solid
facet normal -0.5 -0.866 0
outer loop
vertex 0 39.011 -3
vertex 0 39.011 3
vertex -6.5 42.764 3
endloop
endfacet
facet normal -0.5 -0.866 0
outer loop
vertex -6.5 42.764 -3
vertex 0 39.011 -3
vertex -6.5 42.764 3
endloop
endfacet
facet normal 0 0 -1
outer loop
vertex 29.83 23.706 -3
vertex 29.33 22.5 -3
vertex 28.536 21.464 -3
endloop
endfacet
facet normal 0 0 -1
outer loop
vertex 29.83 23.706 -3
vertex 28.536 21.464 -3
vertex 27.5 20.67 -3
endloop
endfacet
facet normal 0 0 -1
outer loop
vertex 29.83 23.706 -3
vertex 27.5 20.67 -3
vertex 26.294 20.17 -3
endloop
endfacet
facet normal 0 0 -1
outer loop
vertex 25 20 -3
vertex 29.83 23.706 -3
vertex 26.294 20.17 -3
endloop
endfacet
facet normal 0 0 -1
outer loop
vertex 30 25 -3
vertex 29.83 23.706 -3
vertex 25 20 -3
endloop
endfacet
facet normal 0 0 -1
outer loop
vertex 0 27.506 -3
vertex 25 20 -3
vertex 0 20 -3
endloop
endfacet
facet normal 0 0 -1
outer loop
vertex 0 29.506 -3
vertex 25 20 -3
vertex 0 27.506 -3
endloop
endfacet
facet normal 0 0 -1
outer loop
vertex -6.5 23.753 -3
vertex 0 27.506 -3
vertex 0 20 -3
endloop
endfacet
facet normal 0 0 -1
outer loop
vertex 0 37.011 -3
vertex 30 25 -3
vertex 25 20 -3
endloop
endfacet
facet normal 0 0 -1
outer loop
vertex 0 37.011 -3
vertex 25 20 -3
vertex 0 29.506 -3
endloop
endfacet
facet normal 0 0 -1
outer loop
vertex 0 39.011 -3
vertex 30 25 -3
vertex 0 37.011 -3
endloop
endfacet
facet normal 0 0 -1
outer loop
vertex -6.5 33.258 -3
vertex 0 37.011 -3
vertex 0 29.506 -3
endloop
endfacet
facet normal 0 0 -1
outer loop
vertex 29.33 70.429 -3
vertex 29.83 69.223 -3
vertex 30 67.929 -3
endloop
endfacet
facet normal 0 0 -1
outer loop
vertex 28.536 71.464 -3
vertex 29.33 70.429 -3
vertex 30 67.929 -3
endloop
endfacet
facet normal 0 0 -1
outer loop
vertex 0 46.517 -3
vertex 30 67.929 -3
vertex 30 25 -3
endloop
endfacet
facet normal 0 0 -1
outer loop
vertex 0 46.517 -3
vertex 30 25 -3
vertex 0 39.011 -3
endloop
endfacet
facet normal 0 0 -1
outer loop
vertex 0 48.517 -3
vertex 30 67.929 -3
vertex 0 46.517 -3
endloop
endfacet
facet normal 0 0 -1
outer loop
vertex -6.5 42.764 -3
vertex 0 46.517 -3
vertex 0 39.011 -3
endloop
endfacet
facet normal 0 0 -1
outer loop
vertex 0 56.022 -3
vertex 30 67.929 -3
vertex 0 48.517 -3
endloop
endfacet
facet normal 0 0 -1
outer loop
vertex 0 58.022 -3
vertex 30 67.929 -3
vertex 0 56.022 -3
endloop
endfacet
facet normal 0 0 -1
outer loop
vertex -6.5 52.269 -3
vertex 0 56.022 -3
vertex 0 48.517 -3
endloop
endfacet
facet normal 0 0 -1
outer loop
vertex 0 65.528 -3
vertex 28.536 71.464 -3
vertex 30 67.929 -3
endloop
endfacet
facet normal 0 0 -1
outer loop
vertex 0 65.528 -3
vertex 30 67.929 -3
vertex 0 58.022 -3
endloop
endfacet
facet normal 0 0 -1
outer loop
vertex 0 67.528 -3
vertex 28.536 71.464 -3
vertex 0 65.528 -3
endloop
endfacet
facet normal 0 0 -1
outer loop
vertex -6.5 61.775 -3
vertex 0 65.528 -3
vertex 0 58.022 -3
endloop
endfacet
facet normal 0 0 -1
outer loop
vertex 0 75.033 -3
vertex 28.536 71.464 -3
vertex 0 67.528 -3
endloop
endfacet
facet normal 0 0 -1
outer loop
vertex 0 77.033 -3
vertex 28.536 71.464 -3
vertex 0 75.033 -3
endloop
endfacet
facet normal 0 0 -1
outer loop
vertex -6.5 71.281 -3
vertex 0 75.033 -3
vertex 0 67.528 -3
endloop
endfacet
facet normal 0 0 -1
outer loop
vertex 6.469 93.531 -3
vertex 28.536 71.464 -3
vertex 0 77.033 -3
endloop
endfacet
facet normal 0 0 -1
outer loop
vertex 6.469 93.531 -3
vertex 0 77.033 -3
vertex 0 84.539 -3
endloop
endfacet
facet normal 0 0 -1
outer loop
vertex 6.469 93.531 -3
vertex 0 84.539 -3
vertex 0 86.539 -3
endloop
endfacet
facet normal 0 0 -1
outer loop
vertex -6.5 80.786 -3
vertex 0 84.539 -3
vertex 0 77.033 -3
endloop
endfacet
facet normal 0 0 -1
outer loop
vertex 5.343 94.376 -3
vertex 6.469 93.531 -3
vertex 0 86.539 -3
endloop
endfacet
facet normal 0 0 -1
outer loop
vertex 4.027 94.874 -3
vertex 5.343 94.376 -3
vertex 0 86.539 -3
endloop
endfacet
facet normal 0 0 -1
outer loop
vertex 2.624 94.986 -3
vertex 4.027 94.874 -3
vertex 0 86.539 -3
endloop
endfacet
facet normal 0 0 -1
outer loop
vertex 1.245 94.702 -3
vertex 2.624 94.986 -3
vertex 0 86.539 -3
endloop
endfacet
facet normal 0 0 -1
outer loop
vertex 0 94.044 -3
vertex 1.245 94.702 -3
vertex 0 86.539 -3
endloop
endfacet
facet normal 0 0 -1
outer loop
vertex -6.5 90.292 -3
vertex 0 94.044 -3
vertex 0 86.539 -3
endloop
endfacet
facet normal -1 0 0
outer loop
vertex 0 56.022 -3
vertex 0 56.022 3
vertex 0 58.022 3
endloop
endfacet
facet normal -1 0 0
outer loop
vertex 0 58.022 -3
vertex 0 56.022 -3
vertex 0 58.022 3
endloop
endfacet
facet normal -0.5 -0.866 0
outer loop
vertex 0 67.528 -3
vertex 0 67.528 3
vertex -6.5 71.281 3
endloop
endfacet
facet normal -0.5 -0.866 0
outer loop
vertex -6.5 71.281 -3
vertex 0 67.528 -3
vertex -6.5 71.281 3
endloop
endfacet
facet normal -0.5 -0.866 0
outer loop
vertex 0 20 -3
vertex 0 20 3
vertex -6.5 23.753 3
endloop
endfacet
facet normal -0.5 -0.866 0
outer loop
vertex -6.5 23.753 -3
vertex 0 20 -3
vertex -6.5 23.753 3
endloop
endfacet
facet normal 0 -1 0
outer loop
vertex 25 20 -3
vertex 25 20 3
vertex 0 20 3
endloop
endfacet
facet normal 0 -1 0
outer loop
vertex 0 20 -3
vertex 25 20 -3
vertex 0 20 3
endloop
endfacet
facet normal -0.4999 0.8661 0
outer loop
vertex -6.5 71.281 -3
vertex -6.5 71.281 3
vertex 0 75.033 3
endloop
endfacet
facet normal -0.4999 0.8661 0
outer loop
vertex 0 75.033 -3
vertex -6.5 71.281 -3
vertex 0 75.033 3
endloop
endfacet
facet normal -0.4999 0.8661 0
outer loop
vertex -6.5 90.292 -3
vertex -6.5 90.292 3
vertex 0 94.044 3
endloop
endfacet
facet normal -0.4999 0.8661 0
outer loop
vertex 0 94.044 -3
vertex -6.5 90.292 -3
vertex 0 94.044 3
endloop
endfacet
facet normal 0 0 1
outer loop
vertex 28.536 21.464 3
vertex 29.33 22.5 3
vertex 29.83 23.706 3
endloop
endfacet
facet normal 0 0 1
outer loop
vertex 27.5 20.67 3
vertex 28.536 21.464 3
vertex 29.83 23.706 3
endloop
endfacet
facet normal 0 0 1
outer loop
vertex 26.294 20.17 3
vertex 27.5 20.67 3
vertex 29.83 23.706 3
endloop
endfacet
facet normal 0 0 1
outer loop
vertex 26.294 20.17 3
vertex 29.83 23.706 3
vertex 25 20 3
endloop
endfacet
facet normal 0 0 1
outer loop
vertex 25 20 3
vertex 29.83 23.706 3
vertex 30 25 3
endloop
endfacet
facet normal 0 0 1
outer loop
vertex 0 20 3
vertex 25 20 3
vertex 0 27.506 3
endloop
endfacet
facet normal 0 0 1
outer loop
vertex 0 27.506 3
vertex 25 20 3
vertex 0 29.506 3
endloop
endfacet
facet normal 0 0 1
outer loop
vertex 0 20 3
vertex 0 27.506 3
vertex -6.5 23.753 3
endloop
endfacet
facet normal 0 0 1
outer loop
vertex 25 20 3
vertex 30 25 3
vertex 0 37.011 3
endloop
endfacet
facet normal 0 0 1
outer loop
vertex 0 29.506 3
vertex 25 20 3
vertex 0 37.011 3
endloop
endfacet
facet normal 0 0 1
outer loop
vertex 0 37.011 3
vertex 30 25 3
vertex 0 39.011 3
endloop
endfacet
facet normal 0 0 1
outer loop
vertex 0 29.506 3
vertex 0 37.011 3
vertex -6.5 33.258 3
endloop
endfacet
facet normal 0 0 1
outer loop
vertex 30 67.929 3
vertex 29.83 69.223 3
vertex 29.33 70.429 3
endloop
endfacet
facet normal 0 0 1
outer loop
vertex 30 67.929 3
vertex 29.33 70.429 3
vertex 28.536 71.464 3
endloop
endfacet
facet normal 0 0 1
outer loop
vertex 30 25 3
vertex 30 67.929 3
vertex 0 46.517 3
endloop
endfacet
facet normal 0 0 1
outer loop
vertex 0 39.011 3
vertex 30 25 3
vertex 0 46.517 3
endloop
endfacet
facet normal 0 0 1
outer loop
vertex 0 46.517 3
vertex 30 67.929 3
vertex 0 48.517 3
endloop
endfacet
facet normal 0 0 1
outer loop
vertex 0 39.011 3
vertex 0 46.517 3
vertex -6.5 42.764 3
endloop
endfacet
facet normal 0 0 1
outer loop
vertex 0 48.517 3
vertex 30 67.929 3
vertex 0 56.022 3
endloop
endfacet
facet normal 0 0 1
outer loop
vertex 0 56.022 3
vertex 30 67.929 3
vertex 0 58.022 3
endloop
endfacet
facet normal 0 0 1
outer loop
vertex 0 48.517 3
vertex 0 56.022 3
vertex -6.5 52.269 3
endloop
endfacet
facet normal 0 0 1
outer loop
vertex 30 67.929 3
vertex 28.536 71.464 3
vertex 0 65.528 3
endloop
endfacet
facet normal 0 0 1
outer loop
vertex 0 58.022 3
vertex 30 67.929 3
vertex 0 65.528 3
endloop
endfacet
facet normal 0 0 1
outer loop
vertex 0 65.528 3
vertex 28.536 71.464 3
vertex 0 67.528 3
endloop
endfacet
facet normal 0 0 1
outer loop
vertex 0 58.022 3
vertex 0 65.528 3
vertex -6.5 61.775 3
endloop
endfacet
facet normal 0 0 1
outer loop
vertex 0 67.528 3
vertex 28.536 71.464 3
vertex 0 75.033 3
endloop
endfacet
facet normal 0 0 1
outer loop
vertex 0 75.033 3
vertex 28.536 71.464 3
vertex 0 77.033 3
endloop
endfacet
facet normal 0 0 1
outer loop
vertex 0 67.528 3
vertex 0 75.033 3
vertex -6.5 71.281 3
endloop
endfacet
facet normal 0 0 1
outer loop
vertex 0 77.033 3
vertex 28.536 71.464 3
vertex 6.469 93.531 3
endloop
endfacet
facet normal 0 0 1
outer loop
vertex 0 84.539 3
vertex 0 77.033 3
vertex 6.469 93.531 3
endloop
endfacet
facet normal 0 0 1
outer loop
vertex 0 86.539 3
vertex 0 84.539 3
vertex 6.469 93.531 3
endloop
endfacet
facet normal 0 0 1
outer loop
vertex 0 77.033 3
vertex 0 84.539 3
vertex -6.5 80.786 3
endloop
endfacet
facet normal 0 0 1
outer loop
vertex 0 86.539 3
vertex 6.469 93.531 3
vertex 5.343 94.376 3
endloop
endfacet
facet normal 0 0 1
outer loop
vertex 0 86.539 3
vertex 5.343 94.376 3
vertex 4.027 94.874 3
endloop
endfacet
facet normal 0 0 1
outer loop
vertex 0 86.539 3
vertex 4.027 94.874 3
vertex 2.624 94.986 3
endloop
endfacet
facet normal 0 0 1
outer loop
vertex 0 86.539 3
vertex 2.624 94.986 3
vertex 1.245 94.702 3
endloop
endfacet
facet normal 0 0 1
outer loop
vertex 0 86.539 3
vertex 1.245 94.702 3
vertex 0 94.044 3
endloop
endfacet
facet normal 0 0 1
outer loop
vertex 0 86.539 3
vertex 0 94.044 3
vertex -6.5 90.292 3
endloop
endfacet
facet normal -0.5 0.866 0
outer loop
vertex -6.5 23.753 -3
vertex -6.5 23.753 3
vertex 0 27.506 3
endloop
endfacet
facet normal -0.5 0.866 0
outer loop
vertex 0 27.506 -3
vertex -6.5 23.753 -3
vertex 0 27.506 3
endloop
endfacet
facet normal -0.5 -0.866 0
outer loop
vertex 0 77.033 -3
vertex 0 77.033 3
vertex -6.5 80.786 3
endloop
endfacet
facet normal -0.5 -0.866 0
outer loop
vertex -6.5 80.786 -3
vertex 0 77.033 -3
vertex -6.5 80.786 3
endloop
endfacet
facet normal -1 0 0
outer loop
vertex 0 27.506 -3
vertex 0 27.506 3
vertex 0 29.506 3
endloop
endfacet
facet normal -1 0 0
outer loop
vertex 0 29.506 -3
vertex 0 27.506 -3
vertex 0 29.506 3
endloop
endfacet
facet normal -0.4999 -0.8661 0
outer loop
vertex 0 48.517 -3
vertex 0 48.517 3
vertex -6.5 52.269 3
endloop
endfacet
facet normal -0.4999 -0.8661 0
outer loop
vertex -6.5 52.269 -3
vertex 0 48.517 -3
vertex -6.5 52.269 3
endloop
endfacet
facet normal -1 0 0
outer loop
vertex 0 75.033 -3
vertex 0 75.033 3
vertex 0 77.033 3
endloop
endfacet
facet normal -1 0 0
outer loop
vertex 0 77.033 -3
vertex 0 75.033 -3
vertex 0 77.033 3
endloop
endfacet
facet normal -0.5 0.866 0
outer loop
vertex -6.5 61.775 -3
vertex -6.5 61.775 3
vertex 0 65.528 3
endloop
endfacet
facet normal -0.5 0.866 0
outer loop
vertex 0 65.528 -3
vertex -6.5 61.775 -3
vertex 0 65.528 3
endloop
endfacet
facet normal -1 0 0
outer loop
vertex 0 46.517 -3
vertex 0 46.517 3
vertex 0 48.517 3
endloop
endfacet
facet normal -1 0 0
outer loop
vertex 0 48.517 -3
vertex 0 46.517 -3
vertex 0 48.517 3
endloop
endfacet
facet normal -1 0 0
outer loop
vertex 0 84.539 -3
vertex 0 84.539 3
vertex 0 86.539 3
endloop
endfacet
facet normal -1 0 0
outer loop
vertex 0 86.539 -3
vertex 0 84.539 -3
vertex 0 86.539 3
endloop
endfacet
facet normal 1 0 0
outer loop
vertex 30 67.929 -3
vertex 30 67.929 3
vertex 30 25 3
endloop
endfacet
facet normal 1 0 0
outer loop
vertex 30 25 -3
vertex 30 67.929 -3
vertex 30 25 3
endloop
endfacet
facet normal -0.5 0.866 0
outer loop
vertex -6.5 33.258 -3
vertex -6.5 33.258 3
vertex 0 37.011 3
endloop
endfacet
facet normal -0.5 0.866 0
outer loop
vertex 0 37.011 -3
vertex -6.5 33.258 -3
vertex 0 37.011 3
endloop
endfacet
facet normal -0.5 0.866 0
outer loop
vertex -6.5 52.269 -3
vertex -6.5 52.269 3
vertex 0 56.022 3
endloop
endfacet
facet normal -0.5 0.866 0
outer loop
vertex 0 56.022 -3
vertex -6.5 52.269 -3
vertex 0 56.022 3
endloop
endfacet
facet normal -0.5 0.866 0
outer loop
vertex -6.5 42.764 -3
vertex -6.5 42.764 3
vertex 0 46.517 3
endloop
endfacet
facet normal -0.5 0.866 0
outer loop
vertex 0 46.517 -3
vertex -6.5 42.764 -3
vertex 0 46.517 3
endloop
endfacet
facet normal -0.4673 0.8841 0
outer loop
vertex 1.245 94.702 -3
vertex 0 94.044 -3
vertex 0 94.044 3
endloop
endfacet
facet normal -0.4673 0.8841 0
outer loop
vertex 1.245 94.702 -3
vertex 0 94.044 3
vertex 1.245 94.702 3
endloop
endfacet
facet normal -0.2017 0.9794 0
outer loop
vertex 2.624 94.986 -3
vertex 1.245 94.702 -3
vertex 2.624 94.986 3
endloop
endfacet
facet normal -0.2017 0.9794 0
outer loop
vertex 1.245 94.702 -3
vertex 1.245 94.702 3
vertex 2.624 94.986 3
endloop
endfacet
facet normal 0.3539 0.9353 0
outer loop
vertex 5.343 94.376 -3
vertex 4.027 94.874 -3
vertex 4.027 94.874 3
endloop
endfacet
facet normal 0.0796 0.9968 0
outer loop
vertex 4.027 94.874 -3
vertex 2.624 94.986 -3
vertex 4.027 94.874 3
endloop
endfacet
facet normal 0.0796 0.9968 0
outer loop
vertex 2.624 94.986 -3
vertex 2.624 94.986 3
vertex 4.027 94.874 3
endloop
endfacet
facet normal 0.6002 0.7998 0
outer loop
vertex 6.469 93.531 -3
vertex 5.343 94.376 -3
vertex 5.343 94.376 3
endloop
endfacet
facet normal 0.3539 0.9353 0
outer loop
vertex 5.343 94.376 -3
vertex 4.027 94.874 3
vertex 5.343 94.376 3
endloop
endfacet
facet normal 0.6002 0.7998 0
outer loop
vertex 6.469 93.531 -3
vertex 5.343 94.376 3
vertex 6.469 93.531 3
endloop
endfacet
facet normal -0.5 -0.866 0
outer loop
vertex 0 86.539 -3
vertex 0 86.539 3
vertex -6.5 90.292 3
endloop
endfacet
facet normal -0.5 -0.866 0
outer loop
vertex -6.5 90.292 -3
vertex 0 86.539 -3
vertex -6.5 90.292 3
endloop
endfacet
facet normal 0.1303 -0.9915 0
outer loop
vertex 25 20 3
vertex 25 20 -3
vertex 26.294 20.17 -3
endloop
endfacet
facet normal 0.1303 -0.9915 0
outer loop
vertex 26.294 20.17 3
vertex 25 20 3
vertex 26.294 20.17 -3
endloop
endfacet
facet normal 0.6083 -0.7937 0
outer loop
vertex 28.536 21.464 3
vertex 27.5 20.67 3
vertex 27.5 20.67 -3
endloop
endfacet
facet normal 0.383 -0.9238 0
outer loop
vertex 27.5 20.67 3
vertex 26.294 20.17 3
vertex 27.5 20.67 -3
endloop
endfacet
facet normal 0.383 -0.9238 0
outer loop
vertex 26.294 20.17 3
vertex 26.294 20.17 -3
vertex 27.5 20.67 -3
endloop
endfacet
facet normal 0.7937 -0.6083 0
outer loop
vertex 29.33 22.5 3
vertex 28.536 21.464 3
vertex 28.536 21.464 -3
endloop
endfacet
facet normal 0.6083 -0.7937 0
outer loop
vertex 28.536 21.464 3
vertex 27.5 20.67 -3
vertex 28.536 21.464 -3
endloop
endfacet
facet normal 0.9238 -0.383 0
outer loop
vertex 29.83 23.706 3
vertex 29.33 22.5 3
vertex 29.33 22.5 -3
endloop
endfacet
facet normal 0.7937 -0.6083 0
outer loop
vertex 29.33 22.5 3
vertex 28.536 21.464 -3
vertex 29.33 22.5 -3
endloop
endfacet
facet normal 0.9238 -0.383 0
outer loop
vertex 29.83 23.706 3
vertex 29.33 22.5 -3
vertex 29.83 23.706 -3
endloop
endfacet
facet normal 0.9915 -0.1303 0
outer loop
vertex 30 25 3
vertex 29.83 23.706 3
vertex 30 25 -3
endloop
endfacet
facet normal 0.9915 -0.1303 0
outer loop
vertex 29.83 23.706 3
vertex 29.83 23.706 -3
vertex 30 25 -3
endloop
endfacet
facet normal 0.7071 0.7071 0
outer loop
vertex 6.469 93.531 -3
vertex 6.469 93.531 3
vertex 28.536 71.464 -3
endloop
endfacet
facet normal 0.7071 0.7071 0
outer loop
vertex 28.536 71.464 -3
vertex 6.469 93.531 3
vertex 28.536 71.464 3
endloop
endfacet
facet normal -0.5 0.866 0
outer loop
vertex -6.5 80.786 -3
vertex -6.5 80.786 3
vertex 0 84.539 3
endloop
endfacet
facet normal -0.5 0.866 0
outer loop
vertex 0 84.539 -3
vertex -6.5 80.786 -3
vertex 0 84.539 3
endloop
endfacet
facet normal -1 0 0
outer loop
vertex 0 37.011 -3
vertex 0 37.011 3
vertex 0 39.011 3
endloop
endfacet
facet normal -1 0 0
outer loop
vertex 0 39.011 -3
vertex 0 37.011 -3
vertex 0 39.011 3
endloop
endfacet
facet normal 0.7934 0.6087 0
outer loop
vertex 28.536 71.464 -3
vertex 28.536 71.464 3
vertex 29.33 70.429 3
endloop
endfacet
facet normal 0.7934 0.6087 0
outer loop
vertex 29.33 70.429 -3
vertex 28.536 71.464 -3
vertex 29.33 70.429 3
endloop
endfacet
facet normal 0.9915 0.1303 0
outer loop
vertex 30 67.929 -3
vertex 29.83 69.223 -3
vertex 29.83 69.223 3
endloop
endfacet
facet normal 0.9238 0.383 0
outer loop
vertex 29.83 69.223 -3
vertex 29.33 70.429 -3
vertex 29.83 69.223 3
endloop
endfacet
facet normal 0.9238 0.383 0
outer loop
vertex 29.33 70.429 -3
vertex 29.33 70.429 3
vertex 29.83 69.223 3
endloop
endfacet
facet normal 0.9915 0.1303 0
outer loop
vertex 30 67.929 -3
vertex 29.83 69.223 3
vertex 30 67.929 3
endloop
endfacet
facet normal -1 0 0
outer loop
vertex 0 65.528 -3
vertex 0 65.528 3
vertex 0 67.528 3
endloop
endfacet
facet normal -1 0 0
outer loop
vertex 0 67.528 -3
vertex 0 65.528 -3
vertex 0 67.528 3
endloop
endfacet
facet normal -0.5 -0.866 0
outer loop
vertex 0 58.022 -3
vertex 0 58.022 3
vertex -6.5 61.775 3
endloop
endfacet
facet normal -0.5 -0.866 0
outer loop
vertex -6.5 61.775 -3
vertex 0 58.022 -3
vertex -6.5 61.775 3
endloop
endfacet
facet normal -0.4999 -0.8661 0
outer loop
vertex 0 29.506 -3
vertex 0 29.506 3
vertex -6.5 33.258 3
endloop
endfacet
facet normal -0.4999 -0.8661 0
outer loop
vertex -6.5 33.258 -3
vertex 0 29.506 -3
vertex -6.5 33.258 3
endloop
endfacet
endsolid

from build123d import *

# Parameters (mm, degrees)
SALIENTE_EXTRUIR1_DEPTH = 3
SALIENTE_EXTRUIR3_DEPTH = 6
REDONDEO1_R             = 5


with BuildPart() as part:
    # Croquis1 → Saliente-Extruir1 (new, symmetric)
    with BuildSketch(Plane.XY):
        Polygon((0, 20), (0, 100), (30, 70), (30, 20), align=None)
    extrude(amount=SALIENTE_EXTRUIR1_DEPTH, both=True)

    # Croquis4 → Saliente-Extruir3 (add, through all)
    with BuildSketch(Plane.XY.offset(3)):
        Polygon((0, 20), (-6.5, 23.75277675), (0, 27.505553499), align=None)
        Polygon((0, 37.011106999), (0, 29.505553499), (-6.5, 33.258330249), align=None)
        Polygon((0, 46.516660498), (0, 39.011106999), (-6.5, 42.763883749), align=None)
        Polygon((0, 56.022213998), (0, 48.516660498), (-6.5, 52.269437248), align=None)
        Polygon((0, 65.527767497), (0, 58.022213998), (-6.5, 61.774990748), align=None)
        Polygon((0, 75.033320997), (0, 67.527767497), (-6.5, 71.280544247), align=None)
        Polygon((0, 84.538874496), (0, 77.033320997), (-6.5, 80.786097747), align=None)
        Polygon((0, 94.044427996), (0, 86.538874496), (-6.5, 90.291651246), align=None)
    extrude(amount=-SALIENTE_EXTRUIR3_DEPTH)

    # Redondeo1
    # the kernel refuses this fillet: 5 mm, written as the material it takes off along each edge
    with BuildSketch(Plane(origin=(0, 100, 25.871542056), x_dir=(0, -1, 0), z_dir=(0, 0, -1))) as redondeo1_piece_1:
        with BuildLine():
            CenterArc((10.0045829, -2.933515088), REDONDEO1_R, 144.076608278, 80.923391722)
            Line((6.469048994, -6.469048994), (6.398338316, -6.539759672))
            Line((6.398338316, -6.539759672), (-0.070710678, -0.070710678))
            Line((-0.070710678, -0.070710678), (0, 0.1))
            ThreePointArc((0, 0.1), (2.977786002, 0.1), (5.874591786, 0.058670302))
            Line((5.874591786, 0.058670302), (5.955572004, 0))
        make_face()
    extrude(amount=51.743084112, mode=Mode.SUBTRACT)
    with BuildSketch(Plane(origin=(30, 20, -15.5), x_dir=(0, 1, 0), z_dir=(0, 0, 1))) as redondeo1_piece_2:
        with BuildLine():
            CenterArc((REDONDEO1_R, REDONDEO1_R), REDONDEO1_R, 180, 90)
            Line((0, REDONDEO1_R), (-REDONDEO1_R * 0.02, REDONDEO1_R))
            Line((-REDONDEO1_R * 0.02, REDONDEO1_R), (-REDONDEO1_R * 0.02, -REDONDEO1_R * 0.02))
            Line((-REDONDEO1_R * 0.02, -REDONDEO1_R * 0.02), (REDONDEO1_R, -REDONDEO1_R * 0.02))
            Line((REDONDEO1_R, -REDONDEO1_R * 0.02), (REDONDEO1_R, 0))
        make_face()
    extrude(amount=31, mode=Mode.SUBTRACT)
    with BuildSketch(Plane(origin=(30, 70, 8.17766953), x_dir=(-0.7071067811865449, 0.70710678118655, 0), z_dir=(0, 0, -1))) as redondeo1_piece_3:
        with BuildLine():
            CenterArc((REDONDEO1_R * 0.414213562373, -REDONDEO1_R), REDONDEO1_R, 90, 45)
            Line((-REDONDEO1_R * 0.292893218813, -REDONDEO1_R * 0.292893218813), (-REDONDEO1_R * 0.307035354437, -REDONDEO1_R * 0.27875108319))
            Line((-REDONDEO1_R * 0.307035354437, -REDONDEO1_R * 0.27875108319), (-REDONDEO1_R * 0.00828427124746, REDONDEO1_R * 0.02))
            Line((-REDONDEO1_R * 0.00828427124746, REDONDEO1_R * 0.02), (REDONDEO1_R * 0.414213562373, REDONDEO1_R * 0.02))
            Line((REDONDEO1_R * 0.414213562373, REDONDEO1_R * 0.02), (REDONDEO1_R * 0.414213562373, 0))
        make_face()
    extrude(amount=16.355339059, mode=Mode.SUBTRACT)


solid = part.part
